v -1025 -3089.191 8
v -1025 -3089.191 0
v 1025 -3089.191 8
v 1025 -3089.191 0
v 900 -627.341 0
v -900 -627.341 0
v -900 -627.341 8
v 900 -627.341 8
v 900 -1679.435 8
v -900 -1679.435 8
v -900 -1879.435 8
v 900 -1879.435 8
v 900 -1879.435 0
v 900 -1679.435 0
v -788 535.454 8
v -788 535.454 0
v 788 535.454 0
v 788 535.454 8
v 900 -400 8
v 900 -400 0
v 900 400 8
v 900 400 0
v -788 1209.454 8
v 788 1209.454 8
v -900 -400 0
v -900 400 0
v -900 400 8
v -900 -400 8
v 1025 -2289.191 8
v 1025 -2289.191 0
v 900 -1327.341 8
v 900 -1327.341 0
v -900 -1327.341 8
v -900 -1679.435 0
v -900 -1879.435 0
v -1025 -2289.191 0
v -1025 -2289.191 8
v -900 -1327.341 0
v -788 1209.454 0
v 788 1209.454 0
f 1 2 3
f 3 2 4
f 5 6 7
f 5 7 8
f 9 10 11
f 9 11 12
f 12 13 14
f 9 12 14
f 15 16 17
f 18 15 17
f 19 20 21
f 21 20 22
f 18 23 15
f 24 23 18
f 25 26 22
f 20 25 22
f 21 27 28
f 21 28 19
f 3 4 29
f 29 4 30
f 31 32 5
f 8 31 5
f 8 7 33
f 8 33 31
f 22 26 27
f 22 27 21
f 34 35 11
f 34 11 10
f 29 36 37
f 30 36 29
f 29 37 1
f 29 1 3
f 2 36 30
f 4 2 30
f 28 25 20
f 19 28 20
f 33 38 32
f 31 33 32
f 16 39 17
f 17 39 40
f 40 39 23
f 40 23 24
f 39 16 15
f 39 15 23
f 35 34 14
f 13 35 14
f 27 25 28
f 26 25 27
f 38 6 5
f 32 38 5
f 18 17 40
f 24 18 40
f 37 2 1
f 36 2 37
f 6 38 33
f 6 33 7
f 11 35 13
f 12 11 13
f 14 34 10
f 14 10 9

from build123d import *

# Parameters (mm, degrees)
F0_W     = 1800
F0_H     = 800
F0_W_2   = 1576
F0_H_2   = 674
F0_H_3   = 700
F0_H_4   = 200
F0_W_3   = 2050
F1_DEPTH = 8


with BuildPart() as f1:
    # F0 (on Top) → F1 (new body)
    with BuildSketch(Plane.XY):
        Rectangle(F0_W, F0_H)
        with Locations((0, 872.453809)):
            Rectangle(F0_W_2, F0_H_2)
        with Locations((0, -977.340817)):
            Rectangle(F0_W, F0_H_3)
        with Locations((0, -1779.434751)):
            Rectangle(F0_W, F0_H_4)
        with Locations((0, -2689.190865)):
            Rectangle(F0_W_3, F0_H)
    extrude(amount=F1_DEPTH)


solid = f1.part
